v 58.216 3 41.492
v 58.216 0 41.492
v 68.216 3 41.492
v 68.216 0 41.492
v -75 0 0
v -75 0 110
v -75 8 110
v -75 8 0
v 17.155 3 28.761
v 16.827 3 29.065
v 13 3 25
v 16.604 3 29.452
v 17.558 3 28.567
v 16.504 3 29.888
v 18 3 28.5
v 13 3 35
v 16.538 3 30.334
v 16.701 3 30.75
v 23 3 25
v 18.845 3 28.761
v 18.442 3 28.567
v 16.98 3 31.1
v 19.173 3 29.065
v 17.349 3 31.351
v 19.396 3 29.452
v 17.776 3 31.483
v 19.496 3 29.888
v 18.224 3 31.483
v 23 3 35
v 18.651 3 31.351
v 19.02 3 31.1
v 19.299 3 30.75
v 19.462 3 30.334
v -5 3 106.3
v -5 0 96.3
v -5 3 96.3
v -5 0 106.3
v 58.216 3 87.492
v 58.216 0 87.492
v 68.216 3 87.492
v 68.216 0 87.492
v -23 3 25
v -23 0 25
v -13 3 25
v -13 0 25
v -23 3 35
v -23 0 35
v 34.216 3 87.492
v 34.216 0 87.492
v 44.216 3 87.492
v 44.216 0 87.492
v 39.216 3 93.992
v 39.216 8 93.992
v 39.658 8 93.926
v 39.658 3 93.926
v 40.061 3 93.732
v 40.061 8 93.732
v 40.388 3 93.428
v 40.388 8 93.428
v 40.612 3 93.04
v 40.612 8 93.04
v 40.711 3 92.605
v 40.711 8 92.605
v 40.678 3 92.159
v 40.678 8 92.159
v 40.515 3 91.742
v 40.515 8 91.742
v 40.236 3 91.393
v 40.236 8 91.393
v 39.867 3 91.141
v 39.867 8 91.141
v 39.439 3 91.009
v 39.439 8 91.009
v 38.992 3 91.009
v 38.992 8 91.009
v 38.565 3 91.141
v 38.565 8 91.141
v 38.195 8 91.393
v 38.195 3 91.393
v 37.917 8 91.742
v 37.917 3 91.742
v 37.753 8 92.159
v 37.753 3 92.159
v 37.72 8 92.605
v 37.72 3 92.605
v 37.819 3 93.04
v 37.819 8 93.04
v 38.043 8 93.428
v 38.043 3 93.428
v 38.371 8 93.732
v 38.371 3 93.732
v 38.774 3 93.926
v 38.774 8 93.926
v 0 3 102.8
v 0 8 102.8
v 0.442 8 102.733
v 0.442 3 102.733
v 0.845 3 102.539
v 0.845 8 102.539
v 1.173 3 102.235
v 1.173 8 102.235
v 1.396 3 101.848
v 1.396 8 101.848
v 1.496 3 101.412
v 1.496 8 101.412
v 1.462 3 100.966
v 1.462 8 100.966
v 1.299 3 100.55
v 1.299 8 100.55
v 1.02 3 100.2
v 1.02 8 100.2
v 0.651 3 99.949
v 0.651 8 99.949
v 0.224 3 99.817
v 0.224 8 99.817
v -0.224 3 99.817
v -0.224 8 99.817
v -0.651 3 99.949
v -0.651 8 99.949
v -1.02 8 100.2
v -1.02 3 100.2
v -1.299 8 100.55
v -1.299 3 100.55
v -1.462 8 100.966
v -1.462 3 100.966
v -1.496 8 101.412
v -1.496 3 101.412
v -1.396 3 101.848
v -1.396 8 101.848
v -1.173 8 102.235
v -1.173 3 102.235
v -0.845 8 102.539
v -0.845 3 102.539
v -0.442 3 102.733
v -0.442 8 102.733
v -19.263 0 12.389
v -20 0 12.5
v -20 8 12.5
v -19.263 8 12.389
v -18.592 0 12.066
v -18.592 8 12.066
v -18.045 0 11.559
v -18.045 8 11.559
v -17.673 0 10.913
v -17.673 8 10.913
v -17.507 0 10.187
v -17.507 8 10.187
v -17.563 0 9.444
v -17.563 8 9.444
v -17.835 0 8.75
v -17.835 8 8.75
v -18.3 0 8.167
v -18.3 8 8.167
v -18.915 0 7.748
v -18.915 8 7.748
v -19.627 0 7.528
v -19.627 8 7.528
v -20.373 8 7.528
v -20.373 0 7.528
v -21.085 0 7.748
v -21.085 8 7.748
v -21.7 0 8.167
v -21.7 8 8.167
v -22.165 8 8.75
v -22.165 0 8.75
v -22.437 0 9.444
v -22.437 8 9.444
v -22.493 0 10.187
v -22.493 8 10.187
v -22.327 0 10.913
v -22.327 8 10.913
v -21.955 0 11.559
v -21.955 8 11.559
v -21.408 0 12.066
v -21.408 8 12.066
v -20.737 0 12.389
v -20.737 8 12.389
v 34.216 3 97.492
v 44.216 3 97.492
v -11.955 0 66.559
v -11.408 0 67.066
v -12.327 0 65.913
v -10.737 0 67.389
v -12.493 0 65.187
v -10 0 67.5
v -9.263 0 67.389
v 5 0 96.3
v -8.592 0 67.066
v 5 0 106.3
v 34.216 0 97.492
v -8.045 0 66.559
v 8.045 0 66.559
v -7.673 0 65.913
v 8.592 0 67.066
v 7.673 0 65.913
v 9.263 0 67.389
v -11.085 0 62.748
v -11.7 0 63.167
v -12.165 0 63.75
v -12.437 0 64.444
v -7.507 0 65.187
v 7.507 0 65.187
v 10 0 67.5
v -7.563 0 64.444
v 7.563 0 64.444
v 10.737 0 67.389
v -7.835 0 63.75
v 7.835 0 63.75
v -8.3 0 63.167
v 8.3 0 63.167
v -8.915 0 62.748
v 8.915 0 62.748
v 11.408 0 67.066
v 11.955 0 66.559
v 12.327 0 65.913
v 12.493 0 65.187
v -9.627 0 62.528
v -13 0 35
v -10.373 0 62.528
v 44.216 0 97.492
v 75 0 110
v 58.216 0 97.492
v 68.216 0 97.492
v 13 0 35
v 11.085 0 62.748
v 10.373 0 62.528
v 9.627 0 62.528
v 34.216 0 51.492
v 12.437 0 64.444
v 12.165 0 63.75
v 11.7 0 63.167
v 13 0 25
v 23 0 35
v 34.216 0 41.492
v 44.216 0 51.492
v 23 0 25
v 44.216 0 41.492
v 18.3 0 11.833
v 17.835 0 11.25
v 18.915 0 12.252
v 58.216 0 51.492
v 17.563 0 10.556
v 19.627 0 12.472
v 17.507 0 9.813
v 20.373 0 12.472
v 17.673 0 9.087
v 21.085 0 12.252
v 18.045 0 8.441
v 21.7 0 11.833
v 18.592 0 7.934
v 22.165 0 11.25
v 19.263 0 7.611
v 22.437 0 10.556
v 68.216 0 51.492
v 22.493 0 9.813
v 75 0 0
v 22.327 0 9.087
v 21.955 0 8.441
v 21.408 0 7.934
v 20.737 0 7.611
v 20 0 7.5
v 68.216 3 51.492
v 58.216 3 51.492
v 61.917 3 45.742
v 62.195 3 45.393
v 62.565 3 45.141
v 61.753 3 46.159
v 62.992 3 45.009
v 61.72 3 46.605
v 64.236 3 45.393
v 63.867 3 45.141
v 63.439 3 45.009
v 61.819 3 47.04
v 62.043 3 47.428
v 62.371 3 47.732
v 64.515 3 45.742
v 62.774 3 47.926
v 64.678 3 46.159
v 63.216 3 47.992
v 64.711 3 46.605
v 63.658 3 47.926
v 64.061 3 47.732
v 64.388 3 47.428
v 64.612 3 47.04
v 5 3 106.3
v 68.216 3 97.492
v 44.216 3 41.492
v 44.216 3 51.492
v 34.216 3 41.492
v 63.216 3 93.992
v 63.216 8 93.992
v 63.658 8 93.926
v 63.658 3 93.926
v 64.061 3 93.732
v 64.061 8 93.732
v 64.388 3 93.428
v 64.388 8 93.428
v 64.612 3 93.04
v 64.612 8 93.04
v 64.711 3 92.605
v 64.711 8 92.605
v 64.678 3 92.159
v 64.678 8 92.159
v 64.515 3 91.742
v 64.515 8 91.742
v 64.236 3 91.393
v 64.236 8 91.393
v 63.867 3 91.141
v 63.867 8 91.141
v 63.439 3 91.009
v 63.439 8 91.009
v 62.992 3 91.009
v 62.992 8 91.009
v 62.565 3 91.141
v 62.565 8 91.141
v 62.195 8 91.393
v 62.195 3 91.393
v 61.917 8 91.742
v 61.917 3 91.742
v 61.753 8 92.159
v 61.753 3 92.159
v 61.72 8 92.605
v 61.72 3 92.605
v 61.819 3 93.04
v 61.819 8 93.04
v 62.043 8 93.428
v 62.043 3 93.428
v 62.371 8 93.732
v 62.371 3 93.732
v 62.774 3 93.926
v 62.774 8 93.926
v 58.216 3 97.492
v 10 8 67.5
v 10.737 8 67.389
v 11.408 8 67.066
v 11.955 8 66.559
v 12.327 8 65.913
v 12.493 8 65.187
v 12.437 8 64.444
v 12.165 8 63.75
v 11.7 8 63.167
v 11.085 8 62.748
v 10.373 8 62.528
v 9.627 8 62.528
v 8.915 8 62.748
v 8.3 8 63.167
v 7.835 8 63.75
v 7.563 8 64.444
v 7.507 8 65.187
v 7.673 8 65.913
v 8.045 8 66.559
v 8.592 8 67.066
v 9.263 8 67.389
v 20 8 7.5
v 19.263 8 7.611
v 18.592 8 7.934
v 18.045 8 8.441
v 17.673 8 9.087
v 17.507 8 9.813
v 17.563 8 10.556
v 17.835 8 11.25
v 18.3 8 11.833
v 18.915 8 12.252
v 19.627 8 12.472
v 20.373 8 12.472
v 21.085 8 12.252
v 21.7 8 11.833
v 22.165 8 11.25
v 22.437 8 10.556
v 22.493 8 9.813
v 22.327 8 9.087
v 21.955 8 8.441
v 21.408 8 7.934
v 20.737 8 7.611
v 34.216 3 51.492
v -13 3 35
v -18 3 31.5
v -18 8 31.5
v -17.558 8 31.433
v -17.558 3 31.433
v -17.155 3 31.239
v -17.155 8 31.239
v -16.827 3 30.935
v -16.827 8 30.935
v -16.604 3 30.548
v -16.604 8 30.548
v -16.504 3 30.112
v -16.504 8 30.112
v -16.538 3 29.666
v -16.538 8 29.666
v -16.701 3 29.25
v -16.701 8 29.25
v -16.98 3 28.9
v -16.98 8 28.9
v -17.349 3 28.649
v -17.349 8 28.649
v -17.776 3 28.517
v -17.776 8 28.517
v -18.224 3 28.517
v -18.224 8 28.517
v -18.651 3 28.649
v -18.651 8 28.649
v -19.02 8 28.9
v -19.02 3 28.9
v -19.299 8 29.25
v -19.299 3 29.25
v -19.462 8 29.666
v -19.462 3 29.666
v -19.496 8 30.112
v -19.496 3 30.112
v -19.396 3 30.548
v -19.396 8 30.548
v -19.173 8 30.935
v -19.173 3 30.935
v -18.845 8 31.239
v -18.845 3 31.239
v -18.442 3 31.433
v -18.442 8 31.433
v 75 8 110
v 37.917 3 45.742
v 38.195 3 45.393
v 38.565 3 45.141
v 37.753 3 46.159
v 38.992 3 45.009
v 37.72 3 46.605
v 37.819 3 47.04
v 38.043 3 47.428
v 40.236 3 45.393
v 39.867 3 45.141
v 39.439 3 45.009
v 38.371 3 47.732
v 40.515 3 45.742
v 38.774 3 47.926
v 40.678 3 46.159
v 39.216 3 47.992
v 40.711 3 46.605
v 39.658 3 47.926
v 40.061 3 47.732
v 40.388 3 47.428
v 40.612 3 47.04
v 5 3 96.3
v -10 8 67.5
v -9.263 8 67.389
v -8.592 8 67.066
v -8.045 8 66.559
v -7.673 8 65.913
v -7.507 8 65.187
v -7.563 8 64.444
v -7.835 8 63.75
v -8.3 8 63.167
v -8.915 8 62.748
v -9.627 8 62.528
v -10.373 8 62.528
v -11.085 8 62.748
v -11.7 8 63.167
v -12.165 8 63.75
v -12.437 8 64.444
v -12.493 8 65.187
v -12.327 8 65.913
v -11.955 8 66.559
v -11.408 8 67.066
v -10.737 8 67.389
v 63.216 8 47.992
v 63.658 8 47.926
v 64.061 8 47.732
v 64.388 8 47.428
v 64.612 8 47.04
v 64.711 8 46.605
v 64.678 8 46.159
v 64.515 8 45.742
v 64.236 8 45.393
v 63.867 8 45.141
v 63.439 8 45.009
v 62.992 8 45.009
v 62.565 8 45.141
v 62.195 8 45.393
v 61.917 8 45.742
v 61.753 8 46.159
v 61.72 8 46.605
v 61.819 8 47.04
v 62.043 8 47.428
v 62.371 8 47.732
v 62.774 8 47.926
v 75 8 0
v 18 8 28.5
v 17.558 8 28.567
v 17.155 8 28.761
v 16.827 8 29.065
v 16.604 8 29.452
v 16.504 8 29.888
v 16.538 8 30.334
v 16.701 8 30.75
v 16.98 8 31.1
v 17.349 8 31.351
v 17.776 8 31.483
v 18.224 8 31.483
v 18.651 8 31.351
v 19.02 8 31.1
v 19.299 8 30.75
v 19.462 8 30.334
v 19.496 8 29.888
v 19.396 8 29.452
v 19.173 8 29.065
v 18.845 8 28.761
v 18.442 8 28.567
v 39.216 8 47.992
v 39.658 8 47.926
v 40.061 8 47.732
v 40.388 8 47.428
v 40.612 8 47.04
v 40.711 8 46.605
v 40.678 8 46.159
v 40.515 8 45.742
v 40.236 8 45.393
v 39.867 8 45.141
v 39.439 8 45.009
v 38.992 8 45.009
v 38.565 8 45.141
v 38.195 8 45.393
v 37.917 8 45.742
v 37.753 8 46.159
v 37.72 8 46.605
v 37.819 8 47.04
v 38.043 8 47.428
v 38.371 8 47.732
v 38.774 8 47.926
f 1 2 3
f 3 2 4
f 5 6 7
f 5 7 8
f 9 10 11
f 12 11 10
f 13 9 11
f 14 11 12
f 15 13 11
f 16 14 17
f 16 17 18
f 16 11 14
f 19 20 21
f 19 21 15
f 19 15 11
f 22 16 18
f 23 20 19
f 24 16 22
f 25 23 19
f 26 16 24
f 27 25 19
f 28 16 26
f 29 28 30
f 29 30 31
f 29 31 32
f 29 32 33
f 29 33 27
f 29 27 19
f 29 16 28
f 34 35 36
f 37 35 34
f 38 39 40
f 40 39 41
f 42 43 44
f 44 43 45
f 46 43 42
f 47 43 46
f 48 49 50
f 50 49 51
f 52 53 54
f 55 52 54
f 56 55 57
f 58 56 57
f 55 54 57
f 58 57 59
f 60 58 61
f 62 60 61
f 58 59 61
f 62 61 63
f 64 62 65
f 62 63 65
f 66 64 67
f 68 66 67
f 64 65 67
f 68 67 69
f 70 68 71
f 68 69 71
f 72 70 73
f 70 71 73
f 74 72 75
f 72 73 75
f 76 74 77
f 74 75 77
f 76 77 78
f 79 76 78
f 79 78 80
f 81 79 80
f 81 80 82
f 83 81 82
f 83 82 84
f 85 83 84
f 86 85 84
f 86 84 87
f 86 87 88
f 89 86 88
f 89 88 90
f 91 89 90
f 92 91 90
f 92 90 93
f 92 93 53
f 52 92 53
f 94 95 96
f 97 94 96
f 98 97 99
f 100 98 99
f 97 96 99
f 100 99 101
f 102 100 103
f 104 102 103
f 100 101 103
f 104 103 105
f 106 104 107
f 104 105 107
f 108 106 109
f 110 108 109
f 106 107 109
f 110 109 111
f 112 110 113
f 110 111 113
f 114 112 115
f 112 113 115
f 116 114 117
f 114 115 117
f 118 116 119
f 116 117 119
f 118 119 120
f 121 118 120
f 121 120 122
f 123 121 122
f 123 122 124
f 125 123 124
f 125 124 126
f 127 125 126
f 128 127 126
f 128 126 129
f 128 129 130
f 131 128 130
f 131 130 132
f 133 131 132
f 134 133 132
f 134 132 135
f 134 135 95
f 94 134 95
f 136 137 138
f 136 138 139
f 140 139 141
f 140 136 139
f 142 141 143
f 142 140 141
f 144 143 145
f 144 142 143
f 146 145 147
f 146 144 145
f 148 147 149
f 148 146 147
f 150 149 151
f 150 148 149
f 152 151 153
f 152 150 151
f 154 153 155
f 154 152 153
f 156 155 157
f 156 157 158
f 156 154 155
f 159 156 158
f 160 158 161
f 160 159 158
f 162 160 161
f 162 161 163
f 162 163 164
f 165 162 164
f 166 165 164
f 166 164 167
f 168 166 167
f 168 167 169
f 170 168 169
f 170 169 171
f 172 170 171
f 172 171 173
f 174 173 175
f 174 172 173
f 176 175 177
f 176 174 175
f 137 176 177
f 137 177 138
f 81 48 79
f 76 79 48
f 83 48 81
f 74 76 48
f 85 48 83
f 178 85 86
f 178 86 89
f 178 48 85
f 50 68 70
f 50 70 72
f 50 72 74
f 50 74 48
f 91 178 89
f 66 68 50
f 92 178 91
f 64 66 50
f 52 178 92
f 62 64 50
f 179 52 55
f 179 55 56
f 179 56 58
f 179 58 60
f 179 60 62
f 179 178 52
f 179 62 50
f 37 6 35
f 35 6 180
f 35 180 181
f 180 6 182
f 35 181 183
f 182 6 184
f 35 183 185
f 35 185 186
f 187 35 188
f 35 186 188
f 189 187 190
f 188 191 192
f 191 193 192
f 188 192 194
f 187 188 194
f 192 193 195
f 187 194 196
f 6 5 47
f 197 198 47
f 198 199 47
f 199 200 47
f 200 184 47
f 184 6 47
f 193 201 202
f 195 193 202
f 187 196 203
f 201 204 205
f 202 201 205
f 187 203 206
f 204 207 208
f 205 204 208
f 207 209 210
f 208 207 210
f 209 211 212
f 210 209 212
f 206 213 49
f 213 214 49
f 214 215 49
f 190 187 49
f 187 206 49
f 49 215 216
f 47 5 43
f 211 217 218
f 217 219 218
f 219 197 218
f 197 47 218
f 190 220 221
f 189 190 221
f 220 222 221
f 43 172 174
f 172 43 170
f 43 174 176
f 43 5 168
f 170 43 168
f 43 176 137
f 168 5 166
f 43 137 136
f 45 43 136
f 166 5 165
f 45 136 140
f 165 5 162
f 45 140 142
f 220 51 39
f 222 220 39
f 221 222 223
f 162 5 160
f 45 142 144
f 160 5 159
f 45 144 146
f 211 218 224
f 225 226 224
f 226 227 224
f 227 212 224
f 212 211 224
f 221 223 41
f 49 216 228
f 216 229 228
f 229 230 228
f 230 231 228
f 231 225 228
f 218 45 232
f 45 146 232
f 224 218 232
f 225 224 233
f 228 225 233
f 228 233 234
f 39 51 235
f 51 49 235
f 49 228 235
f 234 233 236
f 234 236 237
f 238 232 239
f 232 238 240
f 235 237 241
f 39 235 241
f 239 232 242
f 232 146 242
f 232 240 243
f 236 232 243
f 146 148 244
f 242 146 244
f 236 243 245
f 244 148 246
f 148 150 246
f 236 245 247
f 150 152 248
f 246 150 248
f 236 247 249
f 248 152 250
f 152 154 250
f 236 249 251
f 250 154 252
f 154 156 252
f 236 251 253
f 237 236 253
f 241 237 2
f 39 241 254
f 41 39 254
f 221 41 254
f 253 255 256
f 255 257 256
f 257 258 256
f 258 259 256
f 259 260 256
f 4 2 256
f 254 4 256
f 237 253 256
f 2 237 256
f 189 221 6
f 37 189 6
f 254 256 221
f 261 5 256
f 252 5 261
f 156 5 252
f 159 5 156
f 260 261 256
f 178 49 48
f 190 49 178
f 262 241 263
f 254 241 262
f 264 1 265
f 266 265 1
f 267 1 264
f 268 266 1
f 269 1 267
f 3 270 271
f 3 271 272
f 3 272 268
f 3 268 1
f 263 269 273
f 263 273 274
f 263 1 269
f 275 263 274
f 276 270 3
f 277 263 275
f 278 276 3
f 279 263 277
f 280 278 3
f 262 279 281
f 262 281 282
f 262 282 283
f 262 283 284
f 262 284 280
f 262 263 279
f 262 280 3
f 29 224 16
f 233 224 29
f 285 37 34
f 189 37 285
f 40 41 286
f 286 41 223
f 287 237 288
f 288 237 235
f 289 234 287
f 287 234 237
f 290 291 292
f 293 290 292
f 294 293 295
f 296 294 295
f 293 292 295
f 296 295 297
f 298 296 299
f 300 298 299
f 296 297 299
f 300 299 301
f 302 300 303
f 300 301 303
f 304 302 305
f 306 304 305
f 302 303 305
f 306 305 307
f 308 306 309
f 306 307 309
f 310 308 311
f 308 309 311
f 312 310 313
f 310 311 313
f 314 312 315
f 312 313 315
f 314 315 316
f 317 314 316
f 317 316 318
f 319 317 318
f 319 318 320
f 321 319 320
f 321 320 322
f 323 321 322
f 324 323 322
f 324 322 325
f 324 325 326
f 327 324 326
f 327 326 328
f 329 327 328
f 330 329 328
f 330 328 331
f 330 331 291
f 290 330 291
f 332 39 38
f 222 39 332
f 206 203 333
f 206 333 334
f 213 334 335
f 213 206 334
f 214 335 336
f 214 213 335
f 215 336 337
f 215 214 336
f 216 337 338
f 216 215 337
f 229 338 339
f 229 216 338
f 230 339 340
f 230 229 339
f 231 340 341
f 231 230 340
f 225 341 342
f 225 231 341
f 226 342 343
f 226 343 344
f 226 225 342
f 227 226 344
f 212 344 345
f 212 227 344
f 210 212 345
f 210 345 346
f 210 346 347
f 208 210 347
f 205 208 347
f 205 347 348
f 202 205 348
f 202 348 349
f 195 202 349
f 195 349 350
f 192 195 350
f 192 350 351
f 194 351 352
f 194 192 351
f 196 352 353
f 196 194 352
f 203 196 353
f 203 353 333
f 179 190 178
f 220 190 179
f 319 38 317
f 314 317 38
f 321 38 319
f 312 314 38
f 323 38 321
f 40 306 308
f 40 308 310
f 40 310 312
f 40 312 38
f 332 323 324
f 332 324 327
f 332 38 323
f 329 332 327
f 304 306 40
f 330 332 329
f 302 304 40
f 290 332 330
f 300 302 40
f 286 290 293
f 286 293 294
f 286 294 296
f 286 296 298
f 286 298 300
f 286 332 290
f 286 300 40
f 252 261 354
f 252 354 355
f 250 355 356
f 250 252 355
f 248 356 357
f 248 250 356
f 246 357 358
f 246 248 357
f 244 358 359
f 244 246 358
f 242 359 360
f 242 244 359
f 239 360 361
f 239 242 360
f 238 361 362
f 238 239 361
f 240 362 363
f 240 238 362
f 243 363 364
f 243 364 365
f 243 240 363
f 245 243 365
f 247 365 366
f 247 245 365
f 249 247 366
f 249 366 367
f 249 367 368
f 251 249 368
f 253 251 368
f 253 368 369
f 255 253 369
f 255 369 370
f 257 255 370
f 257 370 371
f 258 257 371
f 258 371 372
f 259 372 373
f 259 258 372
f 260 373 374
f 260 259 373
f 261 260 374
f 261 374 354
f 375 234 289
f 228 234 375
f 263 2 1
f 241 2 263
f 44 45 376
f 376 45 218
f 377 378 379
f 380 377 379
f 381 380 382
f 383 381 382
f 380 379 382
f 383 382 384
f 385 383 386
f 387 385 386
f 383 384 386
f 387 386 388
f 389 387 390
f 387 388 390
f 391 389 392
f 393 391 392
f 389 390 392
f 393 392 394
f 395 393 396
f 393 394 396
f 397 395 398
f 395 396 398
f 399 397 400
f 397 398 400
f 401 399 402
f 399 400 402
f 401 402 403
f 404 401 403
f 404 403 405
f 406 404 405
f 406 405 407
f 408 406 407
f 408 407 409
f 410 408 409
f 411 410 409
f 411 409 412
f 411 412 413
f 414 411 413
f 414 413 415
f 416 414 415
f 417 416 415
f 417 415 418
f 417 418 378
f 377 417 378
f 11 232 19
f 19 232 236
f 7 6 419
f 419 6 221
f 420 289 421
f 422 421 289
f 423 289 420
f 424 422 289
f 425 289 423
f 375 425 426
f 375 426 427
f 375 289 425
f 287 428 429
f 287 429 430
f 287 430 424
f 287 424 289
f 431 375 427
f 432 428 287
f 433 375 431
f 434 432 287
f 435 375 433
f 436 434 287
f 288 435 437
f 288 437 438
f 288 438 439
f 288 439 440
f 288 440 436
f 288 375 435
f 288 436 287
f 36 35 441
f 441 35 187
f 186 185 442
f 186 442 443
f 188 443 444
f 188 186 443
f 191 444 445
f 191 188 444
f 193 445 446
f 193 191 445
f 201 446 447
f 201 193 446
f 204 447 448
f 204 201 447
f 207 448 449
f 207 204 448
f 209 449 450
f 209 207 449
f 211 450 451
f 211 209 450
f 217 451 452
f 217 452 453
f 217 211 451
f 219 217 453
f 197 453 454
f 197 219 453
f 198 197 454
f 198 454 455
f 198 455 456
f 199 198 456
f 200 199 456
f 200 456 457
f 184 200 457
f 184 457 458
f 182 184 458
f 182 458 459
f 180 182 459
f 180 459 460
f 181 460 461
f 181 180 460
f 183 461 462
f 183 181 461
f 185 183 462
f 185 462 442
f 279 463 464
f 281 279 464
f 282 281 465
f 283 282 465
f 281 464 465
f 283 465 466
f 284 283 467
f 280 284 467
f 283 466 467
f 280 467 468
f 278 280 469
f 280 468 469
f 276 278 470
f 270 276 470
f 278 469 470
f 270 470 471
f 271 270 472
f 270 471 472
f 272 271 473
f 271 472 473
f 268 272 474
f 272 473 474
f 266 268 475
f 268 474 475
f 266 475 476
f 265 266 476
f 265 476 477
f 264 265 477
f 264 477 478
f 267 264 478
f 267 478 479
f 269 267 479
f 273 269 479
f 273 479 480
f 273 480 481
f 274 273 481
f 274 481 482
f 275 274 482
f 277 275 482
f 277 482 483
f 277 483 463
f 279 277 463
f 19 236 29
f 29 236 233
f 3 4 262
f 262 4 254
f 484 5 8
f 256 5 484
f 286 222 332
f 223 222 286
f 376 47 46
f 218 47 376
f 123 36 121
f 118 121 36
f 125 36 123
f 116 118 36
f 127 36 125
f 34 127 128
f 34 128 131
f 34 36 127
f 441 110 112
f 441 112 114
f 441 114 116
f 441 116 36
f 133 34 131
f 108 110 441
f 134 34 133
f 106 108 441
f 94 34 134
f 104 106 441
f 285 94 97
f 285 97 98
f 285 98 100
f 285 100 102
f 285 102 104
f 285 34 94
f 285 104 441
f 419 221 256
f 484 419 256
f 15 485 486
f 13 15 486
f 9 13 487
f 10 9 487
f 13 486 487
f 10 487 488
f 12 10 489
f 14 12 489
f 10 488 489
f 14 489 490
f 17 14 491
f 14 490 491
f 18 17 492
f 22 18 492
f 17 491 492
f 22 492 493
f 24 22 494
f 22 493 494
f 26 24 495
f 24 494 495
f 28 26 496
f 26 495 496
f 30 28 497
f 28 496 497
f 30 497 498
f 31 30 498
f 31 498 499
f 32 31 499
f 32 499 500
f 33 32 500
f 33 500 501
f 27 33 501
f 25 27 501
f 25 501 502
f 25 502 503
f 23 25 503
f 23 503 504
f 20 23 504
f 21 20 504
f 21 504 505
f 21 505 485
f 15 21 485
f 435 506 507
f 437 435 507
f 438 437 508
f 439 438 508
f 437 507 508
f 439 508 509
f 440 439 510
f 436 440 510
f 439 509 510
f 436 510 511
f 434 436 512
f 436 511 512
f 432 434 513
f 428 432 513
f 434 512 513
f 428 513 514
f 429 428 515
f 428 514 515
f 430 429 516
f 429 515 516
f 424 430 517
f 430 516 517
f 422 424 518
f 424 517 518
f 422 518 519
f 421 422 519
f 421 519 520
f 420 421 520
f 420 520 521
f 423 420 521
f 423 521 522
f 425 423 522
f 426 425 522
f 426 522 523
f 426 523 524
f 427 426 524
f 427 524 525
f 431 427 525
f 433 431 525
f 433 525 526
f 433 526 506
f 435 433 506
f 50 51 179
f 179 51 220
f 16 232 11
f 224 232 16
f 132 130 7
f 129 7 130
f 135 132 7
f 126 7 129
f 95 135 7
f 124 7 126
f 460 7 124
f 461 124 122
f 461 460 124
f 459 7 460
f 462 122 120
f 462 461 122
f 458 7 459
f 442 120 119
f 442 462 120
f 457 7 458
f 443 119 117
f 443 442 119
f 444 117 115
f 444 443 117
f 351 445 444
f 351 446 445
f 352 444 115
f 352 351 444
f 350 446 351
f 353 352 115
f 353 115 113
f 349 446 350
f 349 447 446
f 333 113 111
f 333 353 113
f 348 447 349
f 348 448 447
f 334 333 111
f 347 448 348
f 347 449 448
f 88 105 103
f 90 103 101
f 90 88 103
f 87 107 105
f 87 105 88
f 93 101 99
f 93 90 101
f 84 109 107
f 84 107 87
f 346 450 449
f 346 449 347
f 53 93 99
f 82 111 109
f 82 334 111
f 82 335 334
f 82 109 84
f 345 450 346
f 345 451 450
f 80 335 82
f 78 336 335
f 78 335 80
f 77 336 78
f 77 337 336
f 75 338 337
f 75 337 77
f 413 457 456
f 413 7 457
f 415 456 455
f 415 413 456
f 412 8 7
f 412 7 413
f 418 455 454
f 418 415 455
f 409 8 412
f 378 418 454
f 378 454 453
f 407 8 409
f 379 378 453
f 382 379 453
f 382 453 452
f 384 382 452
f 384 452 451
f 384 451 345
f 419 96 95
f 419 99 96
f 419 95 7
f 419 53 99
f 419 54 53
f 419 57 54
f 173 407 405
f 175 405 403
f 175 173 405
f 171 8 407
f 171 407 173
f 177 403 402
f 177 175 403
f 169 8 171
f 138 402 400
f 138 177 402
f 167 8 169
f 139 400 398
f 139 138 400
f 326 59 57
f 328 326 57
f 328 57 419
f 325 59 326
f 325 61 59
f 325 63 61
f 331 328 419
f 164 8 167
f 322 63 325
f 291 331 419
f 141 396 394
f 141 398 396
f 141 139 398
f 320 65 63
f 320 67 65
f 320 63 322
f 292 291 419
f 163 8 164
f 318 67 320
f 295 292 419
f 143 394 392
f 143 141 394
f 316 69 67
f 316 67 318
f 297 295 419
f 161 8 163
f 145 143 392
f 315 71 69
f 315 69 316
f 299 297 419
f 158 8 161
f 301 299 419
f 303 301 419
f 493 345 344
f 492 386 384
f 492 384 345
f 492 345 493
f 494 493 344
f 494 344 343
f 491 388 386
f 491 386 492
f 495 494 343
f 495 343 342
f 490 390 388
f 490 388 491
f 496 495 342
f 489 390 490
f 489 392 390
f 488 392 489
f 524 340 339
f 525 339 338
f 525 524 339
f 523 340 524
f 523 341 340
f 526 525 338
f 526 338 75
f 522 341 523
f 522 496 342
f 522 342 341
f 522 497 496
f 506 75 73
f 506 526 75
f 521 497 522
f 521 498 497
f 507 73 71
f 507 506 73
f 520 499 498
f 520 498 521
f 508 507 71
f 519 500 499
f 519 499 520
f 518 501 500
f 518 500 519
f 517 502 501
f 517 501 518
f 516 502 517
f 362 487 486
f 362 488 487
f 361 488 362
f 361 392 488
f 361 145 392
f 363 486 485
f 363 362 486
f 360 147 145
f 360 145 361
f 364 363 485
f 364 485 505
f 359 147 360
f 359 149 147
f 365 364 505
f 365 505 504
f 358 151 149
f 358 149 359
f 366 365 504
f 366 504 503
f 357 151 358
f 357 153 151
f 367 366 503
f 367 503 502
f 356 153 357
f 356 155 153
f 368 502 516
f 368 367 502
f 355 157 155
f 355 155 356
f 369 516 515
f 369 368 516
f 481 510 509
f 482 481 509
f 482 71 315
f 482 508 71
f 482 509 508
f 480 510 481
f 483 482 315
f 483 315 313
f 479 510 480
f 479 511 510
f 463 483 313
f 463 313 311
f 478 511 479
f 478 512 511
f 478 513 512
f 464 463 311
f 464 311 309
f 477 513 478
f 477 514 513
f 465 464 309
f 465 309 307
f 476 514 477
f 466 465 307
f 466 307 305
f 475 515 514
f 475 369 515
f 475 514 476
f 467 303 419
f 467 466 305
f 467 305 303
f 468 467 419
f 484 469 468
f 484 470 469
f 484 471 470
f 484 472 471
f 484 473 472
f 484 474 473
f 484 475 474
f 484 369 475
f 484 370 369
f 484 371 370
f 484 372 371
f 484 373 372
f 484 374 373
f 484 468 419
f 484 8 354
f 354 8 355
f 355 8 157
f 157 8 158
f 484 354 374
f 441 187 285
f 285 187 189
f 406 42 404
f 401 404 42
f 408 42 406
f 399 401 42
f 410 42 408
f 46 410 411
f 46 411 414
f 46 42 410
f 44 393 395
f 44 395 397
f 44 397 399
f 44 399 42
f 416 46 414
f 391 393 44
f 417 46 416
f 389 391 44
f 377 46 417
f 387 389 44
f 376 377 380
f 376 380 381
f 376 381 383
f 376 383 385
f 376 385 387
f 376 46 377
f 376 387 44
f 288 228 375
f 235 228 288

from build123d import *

# Parameters (mm, degrees)
SKETCH1_W           = 150
SKETCH1_H           = 110
SKETCH1_R           = 2.5
BOSS_EXTRUDE1_DEPTH = 8
SKETCH3_R           = 1.5
CUT_EXTRUDE1_DEPTH  = 8
SKETCH4_R           = 1.5
CUT_EXTRUDE2_DEPTH  = 8
SKETCH5_W           = 10
SKETCH5_H           = 10
CUT_EXTRUDE3_DEPTH  = 3


with BuildPart() as part:
    # Sketch1 → Boss-Extrude1 (new body)
    with BuildSketch(Plane(origin=(0, 0, 0), x_dir=(1, 0, 0), z_dir=(0, 1, 0))):
        with Locations((0, -55)):
            Rectangle(SKETCH1_W, SKETCH1_H)
        with Locations(Location((-10, -65, 0), (0, 0, 270))):
            Circle(SKETCH1_R, mode=Mode.SUBTRACT)
        with Locations(Location((10, -65, 0), (0, 0, 270))):
            Circle(SKETCH1_R, mode=Mode.SUBTRACT)
        with Locations(Location((-20, -10, 0), (0, 0, 270))):
            Circle(SKETCH1_R, mode=Mode.SUBTRACT)
        with Locations(Location((20, -10, 0), (0, 0, 90))):
            Circle(SKETCH1_R, mode=Mode.SUBTRACT)
    extrude(amount=BOSS_EXTRUDE1_DEPTH)

    # Sketch3 → Cut-Extrude1 (cut)
    with BuildSketch(Plane(origin=(0, 8, 0), x_dir=(1, 0, 0), z_dir=(0, 1, 0))):
        with Locations(Location((-18, -30, 0), (0, 0, 270))):
            Circle(SKETCH3_R)
        with Locations(Location((18, -30, 0), (0, 0, 90))):
            Circle(SKETCH3_R)
        with Locations(Location((0, -101.3, 0), (0, 0, 270))):
            Circle(SKETCH3_R)
    extrude(amount=-CUT_EXTRUDE1_DEPTH, mode=Mode.SUBTRACT)

    # Sketch4 → Cut-Extrude2 (cut)
    with BuildSketch(Plane(origin=(0, 8, 0), x_dir=(1, 0, 0), z_dir=(0, 1, 0))):
        with Locations(Location((39.215686275, -46.492464754, 0), (0, 0, 270))):
            Circle(SKETCH4_R)
        with Locations(Location((63.215686275, -46.492464754, 0), (0, 0, 270))):
            Circle(SKETCH4_R)
        with Locations(Location((39.215686275, -92.492464754, 0), (0, 0, 270))):
            Circle(SKETCH4_R)
        with Locations(Location((63.215686275, -92.492464754, 0), (0, 0, 270))):
            Circle(SKETCH4_R)
    extrude(amount=-CUT_EXTRUDE2_DEPTH, mode=Mode.SUBTRACT)

    # Sketch5 → Cut-Extrude3 (cut)
    with BuildSketch(Plane.XZ):
        with Locations((0, 101.3)):
            Rectangle(SKETCH5_W, SKETCH5_H)
        with Locations((39.215686275, 92.492464754)):
            Rectangle(SKETCH5_W, SKETCH5_H)
        with Locations((63.215686275, 92.492464754)):
            Rectangle(SKETCH5_W, SKETCH5_H)
        with Locations((63.215686275, 46.492464754)):
            Rectangle(SKETCH5_W, SKETCH5_H)
        with Locations((39.215686275, 46.492464754)):
            Rectangle(SKETCH5_W, SKETCH5_H)
        with Locations((-18, 30)):
            Rectangle(SKETCH5_W, SKETCH5_H)
        with Locations((18, 30)):
            Rectangle(SKETCH5_W, SKETCH5_H)
    extrude(amount=-CUT_EXTRUDE3_DEPTH, mode=Mode.SUBTRACT)


solid = part.part
